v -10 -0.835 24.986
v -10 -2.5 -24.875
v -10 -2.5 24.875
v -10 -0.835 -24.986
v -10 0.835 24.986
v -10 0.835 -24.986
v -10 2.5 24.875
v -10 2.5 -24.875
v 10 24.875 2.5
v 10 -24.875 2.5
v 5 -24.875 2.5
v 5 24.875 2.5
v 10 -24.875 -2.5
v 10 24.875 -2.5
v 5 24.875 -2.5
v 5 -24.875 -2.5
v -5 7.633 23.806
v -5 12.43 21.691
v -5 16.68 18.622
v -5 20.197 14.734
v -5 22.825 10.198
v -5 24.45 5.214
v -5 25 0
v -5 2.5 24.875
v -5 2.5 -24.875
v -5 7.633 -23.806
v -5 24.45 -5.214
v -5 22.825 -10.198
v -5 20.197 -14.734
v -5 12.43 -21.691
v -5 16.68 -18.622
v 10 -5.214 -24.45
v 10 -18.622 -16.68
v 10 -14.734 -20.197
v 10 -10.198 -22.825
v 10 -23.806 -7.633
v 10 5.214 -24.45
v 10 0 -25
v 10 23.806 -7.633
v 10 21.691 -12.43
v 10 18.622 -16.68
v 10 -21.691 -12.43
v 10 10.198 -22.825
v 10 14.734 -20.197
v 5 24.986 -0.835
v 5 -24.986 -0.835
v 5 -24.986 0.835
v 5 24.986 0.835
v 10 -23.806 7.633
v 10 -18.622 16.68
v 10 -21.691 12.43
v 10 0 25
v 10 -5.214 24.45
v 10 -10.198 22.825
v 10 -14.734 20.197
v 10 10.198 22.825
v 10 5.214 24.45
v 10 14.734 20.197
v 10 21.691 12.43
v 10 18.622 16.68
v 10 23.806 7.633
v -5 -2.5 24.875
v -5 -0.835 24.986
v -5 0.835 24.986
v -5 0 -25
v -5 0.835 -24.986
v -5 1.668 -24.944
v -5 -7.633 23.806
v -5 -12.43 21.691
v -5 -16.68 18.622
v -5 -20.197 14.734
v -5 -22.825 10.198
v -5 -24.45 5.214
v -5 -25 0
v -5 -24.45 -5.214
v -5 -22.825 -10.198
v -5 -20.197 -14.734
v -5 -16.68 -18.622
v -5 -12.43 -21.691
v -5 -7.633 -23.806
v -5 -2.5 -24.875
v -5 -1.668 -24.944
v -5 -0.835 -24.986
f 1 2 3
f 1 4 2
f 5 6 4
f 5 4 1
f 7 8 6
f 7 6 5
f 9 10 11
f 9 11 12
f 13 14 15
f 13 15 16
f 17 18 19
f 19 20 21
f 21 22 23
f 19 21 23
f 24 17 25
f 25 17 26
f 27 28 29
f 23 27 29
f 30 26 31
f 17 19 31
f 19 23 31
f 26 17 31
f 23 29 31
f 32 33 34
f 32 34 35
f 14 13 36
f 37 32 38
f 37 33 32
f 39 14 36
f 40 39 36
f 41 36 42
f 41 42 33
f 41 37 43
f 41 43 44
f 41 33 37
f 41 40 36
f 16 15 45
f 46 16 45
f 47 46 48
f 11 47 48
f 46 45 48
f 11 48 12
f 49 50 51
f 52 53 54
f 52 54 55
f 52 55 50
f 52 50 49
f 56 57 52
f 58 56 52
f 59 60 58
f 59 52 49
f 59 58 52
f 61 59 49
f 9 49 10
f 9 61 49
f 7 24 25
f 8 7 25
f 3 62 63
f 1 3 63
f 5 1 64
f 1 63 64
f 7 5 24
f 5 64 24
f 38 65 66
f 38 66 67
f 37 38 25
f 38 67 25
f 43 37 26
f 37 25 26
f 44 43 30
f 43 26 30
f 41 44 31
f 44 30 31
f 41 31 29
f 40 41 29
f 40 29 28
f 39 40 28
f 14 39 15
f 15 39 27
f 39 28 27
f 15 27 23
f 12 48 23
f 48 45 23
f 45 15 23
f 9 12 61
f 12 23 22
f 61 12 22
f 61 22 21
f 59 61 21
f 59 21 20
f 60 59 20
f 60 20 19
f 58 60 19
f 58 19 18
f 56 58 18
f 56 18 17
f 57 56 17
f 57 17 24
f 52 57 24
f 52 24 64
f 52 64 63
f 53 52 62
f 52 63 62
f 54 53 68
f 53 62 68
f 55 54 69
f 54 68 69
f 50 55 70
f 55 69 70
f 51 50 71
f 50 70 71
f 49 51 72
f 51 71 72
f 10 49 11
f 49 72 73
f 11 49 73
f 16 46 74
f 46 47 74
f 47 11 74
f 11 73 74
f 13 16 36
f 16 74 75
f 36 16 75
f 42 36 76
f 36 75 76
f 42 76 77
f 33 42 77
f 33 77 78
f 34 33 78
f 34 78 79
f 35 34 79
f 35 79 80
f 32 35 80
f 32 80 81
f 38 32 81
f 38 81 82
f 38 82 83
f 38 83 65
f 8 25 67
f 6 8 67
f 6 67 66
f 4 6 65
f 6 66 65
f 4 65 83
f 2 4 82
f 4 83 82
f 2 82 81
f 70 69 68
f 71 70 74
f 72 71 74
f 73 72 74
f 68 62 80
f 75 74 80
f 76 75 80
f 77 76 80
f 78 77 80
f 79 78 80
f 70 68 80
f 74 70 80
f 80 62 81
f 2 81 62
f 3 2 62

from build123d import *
from build123d.topology import SkipClean

# Parameters (mm, degrees)
BOSS_EXTRUDE1_DEPTH      = 10
BOSS_EXTRUDE1_DEPTH_BACK = 5
SKETCH1_R                = 25
CUT_EXTRUDE1_DEPTH       = 5
BOSS_EXTRUDE2_DEPTH      = 5


with BuildPart() as part:
    # Sketch1 → Boss-Extrude1 (new, two sides: drawn at the far end of the back side and taken through both)
    with BuildSketch(Plane(origin=(0, 0, 0), x_dir=(0, 0, -1), z_dir=(1, 0, 0)).offset(-BOSS_EXTRUDE1_DEPTH_BACK)):
        Circle(SKETCH1_R)
    extrude(amount=BOSS_EXTRUDE1_DEPTH + BOSS_EXTRUDE1_DEPTH_BACK)

    # Sketch2 → Cut-Extrude1 (cut)
    with BuildSketch(Plane(origin=(10, 0, 0), x_dir=(0, 0, -1), z_dir=(1, 0, 0))):
        with BuildLine():
            Line((2.5, 24.874685928), (2.5, -24.874685928))
            ThreePointArc((2.5, -24.874685928), (0, -25), (-2.5, -24.874685928))
            Line((-2.5, -24.874685928), (-2.5, 24.874685928))
            ThreePointArc((-2.5, 24.874685928), (0, 25), (2.5, 24.874685928))
        make_face()
    extrude(amount=-CUT_EXTRUDE1_DEPTH, mode=Mode.SUBTRACT)

    # Sketch4 → Boss-Extrude2 (add)
    with SkipClean():  # the faces are left unmerged after this step: merging them gives an invalid solid
        with BuildSketch(Plane.ZY.offset(5)):
            with BuildLine():
                Line((-24.874685928, -2.5), (24.874685928, -2.5))
                ThreePointArc((24.874685928, -2.5), (25, 0), (24.874685928, 2.5))
                Line((24.874685928, 2.5), (-24.874685928, 2.5))
                ThreePointArc((-24.874685928, 2.5), (-25, 0), (-24.874685928, -2.5))
            make_face()
        extrude(amount=BOSS_EXTRUDE2_DEPTH)


solid = part.part
